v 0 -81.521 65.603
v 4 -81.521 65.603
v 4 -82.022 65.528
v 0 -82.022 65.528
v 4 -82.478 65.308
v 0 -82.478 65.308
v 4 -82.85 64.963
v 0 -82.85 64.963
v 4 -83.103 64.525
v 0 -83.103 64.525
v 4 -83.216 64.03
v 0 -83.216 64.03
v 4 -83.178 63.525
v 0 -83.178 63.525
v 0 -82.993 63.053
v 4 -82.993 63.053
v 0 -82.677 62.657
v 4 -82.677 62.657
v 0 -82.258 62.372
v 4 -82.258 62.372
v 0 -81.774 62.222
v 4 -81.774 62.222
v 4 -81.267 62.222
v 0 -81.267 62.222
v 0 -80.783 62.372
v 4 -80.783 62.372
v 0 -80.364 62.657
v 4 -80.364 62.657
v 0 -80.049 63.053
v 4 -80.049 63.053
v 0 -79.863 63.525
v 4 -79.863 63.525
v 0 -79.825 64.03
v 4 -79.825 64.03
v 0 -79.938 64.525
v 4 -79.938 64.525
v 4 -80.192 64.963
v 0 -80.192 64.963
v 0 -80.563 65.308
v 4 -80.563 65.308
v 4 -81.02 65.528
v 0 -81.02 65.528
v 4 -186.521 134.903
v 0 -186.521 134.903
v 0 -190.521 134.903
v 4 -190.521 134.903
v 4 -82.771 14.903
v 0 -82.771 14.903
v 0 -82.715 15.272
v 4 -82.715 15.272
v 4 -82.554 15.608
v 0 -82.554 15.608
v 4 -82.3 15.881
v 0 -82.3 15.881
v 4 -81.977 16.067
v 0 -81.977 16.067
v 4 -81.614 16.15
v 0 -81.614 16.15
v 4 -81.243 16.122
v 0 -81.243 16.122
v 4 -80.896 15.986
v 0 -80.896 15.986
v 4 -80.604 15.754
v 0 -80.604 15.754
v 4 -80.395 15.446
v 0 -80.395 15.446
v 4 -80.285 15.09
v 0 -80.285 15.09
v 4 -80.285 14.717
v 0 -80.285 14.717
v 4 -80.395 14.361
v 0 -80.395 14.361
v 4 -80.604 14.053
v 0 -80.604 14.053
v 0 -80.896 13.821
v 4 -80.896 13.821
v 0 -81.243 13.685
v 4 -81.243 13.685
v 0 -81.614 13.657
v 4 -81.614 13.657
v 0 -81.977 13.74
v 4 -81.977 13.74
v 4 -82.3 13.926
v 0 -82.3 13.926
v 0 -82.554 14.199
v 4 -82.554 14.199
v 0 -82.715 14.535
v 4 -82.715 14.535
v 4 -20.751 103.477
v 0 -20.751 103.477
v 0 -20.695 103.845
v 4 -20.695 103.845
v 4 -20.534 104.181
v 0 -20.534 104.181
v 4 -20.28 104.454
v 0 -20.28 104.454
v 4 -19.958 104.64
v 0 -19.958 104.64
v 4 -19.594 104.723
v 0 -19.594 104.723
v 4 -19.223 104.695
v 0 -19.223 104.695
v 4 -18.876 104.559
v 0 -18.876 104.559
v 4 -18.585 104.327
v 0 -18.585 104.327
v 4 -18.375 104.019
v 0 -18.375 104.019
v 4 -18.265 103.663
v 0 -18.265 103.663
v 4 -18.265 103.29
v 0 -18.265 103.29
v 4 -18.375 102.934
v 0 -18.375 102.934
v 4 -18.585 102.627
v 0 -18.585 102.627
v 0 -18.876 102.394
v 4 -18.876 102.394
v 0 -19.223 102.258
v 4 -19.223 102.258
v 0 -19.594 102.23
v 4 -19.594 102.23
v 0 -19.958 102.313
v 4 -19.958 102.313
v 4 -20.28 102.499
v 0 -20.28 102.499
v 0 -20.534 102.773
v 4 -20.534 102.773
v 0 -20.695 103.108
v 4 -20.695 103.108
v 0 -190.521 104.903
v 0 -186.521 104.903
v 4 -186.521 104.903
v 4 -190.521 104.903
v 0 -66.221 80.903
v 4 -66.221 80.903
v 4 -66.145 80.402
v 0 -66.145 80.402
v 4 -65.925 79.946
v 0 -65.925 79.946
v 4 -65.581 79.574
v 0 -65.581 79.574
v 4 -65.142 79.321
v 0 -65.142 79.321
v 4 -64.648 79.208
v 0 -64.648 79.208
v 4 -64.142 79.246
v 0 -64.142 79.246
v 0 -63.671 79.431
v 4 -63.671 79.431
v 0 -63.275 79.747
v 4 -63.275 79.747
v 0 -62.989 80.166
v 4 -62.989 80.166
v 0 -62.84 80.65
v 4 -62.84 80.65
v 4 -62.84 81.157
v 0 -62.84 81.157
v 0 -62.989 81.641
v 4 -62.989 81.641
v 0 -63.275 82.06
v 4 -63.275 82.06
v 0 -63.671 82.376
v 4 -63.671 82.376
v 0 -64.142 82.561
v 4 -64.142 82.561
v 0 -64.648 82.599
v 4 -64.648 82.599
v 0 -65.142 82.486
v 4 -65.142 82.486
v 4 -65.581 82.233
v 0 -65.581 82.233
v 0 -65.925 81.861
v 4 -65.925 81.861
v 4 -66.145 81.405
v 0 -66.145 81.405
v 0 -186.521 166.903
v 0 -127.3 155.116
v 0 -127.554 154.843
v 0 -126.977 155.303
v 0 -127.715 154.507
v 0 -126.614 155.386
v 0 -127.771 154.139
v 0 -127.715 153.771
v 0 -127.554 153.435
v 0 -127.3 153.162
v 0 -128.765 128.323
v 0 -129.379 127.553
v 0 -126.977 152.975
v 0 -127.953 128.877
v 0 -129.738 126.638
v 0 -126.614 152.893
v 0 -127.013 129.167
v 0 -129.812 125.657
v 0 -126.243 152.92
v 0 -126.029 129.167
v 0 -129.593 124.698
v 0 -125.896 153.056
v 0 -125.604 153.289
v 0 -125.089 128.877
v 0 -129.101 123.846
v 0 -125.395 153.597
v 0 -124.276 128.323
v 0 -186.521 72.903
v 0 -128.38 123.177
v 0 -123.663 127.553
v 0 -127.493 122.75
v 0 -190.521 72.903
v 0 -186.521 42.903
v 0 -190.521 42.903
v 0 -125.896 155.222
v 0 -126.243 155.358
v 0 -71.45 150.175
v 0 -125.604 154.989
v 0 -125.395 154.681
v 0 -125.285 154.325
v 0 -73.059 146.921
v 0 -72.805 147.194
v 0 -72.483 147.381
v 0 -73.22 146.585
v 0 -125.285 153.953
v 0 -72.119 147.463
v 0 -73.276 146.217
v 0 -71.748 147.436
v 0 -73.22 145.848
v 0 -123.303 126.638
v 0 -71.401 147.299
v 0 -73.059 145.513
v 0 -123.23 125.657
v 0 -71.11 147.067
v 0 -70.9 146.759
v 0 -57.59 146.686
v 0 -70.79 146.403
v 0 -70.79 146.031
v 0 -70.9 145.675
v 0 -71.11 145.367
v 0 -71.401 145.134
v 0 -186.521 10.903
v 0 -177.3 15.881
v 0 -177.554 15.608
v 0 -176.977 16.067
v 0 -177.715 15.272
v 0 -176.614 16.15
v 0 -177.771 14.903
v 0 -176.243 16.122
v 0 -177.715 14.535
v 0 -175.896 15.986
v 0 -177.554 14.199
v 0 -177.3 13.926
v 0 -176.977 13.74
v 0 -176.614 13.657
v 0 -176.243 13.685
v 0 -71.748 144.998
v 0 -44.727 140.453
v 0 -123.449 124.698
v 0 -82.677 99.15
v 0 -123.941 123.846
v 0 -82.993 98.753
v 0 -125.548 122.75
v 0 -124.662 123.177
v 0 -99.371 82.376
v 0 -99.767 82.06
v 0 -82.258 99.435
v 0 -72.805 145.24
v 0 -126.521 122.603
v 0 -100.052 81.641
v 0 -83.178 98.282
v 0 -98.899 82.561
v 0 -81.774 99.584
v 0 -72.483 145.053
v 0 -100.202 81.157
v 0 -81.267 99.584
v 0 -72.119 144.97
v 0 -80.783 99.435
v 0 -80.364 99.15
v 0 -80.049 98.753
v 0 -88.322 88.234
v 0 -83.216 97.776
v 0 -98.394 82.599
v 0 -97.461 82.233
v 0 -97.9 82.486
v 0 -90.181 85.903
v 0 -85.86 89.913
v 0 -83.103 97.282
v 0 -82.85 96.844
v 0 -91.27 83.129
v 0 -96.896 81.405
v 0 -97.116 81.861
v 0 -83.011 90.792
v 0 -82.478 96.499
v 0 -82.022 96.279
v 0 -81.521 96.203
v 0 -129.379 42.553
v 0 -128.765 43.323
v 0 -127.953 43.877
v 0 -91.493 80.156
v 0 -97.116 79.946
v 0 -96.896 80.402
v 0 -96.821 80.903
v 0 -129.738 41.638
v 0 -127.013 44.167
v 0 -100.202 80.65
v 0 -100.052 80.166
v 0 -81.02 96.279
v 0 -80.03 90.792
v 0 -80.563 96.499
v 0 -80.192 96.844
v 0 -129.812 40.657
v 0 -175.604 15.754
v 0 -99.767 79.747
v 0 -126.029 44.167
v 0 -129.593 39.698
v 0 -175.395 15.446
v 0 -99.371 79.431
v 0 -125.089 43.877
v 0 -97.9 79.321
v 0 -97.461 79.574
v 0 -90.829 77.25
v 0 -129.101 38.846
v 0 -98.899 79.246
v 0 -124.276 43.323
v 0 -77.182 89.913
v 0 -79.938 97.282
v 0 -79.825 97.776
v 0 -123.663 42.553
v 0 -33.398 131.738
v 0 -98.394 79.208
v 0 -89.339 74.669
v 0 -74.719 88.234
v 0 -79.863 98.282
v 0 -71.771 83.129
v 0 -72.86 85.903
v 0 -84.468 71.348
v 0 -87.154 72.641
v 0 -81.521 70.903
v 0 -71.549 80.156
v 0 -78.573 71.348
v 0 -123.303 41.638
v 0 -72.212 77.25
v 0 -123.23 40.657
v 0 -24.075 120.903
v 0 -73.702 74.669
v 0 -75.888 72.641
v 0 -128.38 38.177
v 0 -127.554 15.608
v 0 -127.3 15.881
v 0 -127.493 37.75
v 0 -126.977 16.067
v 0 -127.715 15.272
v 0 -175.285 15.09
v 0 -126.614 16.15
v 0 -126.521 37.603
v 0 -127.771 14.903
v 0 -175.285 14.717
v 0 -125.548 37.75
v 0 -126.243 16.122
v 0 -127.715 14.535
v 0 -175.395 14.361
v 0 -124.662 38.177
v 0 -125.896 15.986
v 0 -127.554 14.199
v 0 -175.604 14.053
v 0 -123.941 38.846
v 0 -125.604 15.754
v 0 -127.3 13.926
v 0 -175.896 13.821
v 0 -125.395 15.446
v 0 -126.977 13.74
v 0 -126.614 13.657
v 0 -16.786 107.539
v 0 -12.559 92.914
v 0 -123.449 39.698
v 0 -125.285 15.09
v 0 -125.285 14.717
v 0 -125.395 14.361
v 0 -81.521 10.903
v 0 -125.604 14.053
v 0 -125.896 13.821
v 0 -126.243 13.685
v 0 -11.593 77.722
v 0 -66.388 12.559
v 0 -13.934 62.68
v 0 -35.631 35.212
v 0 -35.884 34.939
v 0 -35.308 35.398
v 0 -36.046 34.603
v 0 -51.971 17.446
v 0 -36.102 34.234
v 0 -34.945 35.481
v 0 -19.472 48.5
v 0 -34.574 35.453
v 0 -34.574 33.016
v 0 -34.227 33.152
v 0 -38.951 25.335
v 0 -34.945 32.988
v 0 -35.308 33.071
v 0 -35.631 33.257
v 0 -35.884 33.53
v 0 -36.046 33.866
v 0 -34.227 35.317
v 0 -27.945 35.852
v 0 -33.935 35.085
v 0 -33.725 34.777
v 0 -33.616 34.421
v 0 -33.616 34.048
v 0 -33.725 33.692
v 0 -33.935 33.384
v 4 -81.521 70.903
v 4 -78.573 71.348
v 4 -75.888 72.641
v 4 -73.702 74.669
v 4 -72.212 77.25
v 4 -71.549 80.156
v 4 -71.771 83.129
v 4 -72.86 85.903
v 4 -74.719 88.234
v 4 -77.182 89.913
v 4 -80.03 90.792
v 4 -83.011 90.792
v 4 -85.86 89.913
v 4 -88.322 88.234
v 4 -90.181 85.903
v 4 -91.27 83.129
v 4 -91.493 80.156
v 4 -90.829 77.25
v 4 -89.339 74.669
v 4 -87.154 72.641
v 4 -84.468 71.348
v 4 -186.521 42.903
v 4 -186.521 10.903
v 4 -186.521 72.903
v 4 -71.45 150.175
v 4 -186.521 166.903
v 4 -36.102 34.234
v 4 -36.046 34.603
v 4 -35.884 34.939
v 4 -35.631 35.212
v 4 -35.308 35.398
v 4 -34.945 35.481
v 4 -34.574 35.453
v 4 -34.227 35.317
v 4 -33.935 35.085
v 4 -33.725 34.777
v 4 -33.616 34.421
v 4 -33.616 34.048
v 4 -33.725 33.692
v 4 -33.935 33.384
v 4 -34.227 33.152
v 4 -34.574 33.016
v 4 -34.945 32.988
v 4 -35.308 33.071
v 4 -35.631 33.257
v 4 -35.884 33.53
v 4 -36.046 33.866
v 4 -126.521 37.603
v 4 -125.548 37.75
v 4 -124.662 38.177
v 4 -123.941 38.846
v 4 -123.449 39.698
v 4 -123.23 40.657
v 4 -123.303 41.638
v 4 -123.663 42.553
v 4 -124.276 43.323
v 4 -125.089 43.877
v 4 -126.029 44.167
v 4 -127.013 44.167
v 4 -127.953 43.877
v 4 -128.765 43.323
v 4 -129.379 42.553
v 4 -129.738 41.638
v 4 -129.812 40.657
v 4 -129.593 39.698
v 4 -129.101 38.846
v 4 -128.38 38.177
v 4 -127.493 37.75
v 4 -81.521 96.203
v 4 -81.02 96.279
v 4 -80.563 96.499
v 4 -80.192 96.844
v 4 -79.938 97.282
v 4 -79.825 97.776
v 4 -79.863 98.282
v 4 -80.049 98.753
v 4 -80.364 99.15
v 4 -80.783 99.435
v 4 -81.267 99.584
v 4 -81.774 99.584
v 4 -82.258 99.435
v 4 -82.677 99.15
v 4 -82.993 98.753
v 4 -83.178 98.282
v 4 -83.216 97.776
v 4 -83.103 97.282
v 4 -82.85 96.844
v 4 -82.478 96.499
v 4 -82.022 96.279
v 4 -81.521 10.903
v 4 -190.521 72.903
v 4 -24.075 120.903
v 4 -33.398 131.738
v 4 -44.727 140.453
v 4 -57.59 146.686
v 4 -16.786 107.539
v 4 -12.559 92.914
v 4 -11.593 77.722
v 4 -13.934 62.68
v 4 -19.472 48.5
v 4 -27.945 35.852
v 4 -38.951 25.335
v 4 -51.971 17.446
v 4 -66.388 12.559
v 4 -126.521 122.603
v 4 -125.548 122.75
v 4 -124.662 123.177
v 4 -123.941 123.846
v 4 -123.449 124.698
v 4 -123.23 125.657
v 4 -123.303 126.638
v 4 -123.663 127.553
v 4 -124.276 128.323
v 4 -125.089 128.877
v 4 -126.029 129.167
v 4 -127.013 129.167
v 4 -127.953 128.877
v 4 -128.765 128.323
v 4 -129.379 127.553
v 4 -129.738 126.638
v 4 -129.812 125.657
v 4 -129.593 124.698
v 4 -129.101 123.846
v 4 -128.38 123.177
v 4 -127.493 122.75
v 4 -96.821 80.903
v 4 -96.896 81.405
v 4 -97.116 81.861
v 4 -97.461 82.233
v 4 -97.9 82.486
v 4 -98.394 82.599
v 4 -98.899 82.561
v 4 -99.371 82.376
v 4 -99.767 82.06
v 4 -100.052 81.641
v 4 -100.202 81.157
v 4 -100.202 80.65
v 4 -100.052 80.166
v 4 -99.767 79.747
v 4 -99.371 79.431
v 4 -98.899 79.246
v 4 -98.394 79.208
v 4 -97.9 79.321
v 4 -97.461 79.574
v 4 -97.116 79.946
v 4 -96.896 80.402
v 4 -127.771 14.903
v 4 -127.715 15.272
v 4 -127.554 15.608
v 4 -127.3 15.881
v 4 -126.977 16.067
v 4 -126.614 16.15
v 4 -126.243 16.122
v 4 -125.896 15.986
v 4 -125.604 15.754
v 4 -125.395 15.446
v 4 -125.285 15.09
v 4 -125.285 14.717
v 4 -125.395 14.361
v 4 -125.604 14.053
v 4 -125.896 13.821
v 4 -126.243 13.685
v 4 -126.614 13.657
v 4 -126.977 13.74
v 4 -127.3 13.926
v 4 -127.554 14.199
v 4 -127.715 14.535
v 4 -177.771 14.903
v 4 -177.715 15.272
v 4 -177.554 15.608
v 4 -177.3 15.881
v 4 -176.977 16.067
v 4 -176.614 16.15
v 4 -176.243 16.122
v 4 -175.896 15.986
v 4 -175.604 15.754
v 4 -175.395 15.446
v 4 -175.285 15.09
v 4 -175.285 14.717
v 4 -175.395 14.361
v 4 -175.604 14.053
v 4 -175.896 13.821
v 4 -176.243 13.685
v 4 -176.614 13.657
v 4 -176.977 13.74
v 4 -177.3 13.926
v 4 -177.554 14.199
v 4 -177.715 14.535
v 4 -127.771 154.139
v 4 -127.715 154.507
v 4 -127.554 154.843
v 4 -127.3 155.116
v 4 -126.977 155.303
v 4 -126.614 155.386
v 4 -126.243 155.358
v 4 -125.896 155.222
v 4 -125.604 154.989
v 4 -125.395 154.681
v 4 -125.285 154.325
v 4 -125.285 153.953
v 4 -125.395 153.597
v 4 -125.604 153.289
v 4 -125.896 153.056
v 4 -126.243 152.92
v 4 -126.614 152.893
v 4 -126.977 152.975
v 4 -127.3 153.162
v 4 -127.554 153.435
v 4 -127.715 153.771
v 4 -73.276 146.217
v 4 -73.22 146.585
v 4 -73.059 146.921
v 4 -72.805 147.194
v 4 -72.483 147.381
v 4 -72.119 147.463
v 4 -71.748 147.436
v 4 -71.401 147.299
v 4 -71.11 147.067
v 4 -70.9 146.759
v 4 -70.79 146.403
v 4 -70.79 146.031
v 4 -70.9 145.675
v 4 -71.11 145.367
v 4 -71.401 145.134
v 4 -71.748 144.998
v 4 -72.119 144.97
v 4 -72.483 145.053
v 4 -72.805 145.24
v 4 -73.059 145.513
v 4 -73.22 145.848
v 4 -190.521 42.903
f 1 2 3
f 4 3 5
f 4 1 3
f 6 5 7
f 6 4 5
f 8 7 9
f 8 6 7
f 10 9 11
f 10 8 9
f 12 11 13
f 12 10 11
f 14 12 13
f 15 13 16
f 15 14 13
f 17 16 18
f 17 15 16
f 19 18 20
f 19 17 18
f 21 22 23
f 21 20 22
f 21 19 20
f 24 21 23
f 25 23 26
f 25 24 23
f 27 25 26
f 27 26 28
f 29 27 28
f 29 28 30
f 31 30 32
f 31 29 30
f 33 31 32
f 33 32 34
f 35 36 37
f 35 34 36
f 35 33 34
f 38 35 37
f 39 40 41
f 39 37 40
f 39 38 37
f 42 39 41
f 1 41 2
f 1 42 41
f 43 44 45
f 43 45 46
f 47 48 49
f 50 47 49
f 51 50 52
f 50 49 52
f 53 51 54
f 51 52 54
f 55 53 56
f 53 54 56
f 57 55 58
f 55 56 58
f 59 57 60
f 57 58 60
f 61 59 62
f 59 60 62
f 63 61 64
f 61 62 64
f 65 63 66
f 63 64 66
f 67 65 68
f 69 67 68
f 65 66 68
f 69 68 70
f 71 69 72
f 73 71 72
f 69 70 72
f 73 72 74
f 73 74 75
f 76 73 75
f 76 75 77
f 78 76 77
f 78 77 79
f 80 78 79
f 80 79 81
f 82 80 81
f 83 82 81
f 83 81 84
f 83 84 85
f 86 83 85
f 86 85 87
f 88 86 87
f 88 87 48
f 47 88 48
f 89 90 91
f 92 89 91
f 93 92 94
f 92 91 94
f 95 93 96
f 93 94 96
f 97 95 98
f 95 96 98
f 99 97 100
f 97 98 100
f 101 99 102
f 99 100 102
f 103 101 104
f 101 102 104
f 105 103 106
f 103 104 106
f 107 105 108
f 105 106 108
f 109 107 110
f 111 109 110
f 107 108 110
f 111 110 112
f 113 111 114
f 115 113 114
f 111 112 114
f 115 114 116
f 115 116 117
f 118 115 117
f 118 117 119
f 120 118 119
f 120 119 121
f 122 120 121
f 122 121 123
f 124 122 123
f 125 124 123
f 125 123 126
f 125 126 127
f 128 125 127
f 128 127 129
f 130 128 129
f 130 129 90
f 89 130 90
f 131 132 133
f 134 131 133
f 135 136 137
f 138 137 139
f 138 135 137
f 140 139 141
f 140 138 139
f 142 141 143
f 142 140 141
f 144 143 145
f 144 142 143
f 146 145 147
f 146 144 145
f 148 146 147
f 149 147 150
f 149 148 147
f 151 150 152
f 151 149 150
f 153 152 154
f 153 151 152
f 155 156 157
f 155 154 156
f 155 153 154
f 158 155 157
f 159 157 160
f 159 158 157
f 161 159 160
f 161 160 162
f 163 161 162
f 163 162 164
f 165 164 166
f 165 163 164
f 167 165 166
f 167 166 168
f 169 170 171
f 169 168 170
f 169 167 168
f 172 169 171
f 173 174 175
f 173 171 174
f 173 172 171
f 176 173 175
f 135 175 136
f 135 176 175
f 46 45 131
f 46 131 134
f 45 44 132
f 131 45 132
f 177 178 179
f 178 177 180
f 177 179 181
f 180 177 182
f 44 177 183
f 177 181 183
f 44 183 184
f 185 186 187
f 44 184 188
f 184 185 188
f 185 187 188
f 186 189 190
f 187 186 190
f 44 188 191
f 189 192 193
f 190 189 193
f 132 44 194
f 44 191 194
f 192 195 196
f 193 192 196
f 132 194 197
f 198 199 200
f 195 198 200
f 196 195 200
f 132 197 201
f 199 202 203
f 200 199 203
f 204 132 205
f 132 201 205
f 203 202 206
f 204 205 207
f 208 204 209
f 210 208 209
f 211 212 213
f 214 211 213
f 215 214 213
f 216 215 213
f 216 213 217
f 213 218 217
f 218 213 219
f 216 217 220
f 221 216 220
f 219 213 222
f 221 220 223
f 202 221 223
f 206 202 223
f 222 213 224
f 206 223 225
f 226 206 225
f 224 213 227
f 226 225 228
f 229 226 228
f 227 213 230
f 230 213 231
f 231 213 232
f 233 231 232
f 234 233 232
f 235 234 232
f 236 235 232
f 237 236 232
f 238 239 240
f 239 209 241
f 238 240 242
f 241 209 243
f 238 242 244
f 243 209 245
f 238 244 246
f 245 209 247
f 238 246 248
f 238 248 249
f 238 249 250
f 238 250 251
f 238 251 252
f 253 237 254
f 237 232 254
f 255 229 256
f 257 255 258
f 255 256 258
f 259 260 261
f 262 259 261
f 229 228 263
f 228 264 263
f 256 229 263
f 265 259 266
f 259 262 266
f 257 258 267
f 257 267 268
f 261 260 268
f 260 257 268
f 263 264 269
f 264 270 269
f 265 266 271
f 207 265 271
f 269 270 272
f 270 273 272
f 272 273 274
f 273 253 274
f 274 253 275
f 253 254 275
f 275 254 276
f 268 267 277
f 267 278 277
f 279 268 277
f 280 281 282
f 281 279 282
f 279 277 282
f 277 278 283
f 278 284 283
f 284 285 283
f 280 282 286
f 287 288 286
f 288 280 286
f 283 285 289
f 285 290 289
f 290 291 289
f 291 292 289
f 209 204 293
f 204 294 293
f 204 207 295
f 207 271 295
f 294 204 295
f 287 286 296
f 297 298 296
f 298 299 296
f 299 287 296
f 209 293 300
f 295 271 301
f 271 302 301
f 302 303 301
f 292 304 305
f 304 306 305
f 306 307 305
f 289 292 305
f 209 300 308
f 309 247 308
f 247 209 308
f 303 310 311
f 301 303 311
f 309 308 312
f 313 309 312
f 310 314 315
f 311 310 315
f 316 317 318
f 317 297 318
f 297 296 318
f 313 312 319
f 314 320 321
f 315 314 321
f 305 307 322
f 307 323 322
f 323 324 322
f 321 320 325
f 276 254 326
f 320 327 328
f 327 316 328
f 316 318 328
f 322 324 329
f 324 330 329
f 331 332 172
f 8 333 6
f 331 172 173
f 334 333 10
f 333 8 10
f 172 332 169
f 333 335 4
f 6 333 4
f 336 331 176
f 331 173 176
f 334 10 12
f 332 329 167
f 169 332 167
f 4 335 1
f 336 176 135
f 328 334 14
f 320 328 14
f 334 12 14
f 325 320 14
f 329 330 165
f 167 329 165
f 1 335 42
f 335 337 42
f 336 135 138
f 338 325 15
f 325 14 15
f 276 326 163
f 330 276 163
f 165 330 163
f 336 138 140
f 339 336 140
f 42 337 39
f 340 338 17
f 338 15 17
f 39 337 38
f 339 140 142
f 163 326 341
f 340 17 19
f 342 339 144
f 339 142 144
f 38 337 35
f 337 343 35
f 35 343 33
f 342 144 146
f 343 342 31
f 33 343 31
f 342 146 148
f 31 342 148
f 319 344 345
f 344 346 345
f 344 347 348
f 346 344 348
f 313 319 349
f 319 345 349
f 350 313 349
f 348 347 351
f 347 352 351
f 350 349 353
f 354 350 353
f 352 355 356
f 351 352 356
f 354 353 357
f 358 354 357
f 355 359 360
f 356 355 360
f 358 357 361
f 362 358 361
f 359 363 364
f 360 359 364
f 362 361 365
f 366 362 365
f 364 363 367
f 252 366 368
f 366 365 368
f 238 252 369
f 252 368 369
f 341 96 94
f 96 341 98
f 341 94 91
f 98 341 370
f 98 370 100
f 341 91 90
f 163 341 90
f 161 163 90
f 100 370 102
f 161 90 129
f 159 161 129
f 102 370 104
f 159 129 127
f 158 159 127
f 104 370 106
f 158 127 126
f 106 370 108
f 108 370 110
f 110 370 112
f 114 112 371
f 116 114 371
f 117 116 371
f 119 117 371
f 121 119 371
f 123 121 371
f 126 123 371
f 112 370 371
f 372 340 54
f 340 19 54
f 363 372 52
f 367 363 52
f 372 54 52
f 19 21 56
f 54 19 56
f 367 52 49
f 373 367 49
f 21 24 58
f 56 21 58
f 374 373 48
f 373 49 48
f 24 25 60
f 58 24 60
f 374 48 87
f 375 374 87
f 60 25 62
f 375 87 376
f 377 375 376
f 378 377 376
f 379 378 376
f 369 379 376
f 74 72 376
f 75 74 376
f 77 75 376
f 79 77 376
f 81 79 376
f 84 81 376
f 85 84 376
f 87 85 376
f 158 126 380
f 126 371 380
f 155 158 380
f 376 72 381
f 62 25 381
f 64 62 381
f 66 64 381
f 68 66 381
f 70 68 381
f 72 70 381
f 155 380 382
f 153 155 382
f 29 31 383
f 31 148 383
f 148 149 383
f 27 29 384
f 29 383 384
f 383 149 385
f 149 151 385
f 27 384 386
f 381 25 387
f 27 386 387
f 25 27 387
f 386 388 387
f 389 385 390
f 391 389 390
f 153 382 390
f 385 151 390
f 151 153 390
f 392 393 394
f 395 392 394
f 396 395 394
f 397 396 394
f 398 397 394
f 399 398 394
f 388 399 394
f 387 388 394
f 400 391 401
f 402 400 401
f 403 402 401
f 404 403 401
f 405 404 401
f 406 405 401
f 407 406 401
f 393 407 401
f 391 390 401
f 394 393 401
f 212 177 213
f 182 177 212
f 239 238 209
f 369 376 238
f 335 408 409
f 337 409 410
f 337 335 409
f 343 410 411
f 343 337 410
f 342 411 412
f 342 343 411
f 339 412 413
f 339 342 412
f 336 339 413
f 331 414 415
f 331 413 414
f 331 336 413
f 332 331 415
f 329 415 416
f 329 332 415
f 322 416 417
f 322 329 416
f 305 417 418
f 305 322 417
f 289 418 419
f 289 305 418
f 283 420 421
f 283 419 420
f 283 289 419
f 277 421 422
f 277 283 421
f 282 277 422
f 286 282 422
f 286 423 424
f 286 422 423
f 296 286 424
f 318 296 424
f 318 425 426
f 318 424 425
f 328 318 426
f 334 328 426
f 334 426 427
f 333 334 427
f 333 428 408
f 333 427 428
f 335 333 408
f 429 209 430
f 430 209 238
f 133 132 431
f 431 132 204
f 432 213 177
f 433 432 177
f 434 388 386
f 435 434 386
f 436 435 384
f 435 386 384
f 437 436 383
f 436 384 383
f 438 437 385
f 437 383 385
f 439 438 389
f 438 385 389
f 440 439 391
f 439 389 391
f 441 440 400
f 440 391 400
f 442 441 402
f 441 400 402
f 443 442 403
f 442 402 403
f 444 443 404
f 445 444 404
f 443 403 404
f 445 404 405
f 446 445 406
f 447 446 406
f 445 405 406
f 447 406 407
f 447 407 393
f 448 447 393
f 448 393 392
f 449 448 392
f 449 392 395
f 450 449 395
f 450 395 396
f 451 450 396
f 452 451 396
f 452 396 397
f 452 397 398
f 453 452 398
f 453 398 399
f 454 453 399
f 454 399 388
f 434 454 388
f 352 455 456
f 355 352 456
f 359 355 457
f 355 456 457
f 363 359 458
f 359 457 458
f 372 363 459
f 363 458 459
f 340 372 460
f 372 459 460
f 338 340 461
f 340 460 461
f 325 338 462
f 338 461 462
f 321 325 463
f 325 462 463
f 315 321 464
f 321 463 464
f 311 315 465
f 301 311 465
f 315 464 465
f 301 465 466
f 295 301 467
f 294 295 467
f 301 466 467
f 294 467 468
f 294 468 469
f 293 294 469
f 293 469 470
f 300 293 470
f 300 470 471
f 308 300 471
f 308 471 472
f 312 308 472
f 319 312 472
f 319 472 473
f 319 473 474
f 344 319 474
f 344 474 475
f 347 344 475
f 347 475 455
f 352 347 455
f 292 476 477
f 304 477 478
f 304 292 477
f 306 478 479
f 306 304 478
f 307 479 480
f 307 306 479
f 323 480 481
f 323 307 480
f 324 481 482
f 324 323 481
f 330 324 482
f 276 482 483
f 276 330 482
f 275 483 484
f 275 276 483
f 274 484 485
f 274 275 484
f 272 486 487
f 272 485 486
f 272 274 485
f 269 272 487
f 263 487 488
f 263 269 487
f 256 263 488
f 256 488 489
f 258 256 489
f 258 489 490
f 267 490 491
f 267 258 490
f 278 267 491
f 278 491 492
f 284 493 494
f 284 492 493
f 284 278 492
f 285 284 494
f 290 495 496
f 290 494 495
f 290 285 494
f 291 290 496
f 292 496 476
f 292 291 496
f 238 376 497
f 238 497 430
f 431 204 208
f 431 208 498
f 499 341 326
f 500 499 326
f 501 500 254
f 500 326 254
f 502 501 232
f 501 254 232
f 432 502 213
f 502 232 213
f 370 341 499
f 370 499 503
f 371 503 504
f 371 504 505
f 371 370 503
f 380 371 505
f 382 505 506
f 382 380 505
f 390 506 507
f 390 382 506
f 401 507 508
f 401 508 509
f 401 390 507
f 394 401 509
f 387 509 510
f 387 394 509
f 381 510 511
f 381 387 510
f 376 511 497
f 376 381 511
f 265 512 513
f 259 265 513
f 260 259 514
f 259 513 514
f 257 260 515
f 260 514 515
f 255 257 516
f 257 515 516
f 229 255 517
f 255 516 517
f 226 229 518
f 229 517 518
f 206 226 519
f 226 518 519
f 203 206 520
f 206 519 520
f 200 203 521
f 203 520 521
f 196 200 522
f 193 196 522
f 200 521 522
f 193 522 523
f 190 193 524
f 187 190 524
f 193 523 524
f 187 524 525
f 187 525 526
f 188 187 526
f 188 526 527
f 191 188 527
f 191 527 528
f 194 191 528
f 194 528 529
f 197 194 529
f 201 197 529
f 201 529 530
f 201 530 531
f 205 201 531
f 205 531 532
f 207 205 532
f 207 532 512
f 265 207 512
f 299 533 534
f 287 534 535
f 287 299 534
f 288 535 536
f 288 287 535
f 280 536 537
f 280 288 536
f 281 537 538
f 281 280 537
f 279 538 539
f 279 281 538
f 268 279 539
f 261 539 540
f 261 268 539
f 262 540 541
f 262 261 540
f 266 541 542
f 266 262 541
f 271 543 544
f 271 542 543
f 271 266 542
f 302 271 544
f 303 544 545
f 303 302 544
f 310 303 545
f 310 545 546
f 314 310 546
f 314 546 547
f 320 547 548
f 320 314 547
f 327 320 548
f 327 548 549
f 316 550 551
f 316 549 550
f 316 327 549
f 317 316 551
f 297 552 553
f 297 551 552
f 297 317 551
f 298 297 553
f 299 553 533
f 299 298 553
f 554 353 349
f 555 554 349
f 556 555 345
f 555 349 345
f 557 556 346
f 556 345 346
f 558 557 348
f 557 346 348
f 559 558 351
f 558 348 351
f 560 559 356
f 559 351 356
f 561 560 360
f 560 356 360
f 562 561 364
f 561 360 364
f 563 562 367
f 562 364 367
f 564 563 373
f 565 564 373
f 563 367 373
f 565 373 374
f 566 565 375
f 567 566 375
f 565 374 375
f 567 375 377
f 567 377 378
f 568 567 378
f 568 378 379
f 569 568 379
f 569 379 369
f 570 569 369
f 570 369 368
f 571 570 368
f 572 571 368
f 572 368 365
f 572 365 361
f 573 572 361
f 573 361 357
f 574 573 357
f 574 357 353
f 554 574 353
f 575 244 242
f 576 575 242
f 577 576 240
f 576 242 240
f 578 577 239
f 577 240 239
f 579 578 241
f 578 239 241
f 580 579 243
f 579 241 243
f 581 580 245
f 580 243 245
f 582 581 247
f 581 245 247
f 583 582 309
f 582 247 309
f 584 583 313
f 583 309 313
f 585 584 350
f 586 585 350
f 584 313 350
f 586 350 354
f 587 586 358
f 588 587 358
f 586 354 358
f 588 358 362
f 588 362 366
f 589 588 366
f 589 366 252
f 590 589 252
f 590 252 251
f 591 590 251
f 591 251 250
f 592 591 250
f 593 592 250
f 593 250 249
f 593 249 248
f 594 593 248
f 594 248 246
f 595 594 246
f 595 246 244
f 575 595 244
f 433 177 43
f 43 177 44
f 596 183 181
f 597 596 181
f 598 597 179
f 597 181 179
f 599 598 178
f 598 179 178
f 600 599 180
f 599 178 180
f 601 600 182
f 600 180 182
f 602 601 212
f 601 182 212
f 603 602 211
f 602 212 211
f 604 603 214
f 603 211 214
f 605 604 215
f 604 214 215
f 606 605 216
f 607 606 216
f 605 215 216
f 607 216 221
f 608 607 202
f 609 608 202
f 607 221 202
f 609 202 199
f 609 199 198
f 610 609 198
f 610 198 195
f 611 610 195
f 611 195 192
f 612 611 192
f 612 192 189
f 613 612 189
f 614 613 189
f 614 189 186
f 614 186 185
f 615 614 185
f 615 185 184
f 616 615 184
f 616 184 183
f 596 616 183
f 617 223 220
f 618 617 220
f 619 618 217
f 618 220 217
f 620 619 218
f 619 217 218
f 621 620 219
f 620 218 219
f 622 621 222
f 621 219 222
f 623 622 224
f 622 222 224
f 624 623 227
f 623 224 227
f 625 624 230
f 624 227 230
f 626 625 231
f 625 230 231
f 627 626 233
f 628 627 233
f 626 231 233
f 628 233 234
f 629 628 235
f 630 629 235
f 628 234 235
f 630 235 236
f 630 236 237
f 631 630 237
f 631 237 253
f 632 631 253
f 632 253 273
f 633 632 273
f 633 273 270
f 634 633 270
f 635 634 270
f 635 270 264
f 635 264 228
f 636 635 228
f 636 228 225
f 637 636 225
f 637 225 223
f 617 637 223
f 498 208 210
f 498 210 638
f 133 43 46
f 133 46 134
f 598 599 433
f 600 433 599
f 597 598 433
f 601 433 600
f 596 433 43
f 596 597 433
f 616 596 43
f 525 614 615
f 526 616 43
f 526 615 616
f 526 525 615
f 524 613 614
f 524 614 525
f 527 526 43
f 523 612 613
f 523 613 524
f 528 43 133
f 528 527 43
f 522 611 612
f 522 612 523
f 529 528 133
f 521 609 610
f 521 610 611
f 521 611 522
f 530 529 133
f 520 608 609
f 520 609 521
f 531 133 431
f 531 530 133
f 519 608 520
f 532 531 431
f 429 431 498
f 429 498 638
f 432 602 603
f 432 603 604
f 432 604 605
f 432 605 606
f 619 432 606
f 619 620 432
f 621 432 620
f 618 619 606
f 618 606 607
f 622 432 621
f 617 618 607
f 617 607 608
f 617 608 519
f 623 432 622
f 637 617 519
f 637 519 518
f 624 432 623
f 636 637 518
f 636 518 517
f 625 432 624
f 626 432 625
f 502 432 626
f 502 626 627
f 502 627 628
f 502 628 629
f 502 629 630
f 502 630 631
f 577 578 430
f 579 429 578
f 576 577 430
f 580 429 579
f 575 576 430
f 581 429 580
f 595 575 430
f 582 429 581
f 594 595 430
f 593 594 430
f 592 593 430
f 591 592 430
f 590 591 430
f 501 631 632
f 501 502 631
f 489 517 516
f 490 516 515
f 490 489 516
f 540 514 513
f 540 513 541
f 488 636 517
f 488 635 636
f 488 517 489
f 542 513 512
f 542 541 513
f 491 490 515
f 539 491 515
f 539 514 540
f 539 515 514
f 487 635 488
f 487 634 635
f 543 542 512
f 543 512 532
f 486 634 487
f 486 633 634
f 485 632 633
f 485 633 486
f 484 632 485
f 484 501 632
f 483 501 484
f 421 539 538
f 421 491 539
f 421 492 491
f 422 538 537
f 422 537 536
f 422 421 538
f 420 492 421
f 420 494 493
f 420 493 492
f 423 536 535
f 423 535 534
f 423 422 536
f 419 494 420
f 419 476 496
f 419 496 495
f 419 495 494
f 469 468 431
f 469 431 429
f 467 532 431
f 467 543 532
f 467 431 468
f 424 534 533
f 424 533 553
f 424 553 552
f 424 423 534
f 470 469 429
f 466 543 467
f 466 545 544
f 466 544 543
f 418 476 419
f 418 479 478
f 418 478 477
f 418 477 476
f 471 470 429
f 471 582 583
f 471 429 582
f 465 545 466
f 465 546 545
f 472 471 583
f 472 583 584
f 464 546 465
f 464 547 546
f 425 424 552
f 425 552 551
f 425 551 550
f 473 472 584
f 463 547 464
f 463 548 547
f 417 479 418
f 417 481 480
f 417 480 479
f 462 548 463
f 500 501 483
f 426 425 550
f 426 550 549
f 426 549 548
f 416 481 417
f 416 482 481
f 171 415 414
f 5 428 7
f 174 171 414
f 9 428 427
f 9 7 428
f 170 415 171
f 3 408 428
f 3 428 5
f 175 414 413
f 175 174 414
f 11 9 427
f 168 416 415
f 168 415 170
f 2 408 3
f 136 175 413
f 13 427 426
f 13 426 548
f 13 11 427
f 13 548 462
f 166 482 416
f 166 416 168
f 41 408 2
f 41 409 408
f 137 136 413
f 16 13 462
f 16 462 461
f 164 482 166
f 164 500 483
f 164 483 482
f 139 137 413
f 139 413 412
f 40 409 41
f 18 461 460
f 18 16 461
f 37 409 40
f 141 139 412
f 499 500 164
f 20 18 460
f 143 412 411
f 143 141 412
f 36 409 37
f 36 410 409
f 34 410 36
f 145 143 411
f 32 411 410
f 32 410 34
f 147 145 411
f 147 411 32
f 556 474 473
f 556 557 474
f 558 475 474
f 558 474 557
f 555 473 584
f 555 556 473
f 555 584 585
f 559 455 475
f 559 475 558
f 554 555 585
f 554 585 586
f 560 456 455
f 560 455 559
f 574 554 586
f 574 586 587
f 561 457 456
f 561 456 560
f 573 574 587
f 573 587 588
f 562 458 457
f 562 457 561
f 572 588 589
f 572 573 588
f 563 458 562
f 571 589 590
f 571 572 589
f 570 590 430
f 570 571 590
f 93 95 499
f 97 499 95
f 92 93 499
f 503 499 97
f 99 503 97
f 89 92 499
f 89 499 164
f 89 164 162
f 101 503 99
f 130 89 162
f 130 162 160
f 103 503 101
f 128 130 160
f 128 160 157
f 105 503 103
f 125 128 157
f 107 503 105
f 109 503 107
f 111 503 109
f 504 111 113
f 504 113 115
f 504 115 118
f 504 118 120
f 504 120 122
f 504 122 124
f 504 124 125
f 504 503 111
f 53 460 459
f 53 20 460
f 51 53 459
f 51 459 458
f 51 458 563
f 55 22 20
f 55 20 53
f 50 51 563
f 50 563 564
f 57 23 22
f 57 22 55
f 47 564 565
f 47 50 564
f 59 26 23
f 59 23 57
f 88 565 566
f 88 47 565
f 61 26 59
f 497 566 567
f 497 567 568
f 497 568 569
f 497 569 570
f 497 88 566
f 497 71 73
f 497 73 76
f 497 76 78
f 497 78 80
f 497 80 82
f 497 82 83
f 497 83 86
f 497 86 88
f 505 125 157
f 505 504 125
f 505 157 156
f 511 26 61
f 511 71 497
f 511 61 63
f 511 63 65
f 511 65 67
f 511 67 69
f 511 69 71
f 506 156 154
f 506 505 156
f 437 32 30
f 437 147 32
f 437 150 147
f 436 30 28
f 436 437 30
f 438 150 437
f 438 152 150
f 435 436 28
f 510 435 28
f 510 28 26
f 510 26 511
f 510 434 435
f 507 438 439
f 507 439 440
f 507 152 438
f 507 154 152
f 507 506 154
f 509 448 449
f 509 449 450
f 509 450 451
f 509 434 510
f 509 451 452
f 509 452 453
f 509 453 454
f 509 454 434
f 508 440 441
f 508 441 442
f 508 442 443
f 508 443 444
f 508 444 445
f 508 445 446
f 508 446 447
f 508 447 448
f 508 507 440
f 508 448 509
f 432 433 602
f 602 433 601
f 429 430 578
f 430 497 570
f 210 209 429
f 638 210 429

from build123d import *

# Parameters (mm, degrees)
AUFSATZ_LINEAR_AUSTRAGEN1_DEPTH      = 4
SKIZZE1_9_R                          = 10
SCHNITT_LINEAR_AUSTRAGEN1_DEPTH      = 6
SCHNITT_LINEAR_AUSTRAGEN2_DEPTH      = 251.325290812
SCHNITT_LINEAR_AUSTRAGEN2_DEPTH_BACK = 10
M3_GEWINDEBOHRUNG1_D                 = 2.5
M3_GEWINDEBOHRUNG1_DEPTH             = 8.5
M3_GEWINDEBOHRUNG1_TIP               = 0.751075774
KREISMUSTER1_COUNT                   = 4
DURCHGANGSLOCH_F_R_M61_D             = 6.6
DURCHGANGSLOCH_F_R_M61_DEPTH         = 17
DURCHGANGSLOCH_F_R_M61_TIP           = 1.982840043
SKIZZE32_W                           = 4
SKIZZE32_H                           = 30
AUFSATZ_LINEAR_AUSTRAGEN2_DEPTH      = 4


with BuildPart() as part:
    # Skizze1 → Aufsatz-Linear austragen1 (new body)
    with BuildSketch(Plane(origin=(0, 0, 0), x_dir=(0, 0, -1), z_dir=(1, 0, 0))):
        with BuildLine():
            Line((-120.903454086, -13.395859459), (-120.903454086, -24.075118314))
            ThreePointArc((-120.903454086, -24.075118314), (-140.453351678, -44.726591756), (-150.175306123, -71.450465968))
            Line((-150.175306123, -71.450465968), (-166.903454086, -186.520744783))
            Line((-166.903454086, -186.520744783), (-10.903454086, -186.520744783))
            Line((-10.903454086, -186.520744783), (-1.903454086, -186.520744783))
            Line((-1.903454086, -186.520744783), (-1.903454086, -81.52074478))
            ThreePointArc((-1.903454086, -81.52074478), (-41.654250272, -12.960552248), (-120.903454086, -13.395859459))
        make_face()
    extrude(amount=AUFSATZ_LINEAR_AUSTRAGEN1_DEPTH)

    # Skizze1<9> → Schnitt-Linear austragen1 (cut)
    with BuildSketch(Plane(origin=(0, 0, 0), x_dir=(0, 0, -1), z_dir=(1, 0, 0))):
        with Locations((-80.903454086, -81.52074478)):
            Circle(SKIZZE1_9_R)
    extrude(amount=SCHNITT_LINEAR_AUSTRAGEN1_DEPTH, mode=Mode.SUBTRACT)

    # Skizze3 → Durchgangsloch für M31 (revolve, cut)
    with BuildSketch(Plane(origin=(0, -81.52074478, 63.903454086), x_dir=(0, 0, 1), z_dir=(0, 1, 0))):
        Polygon((0, 0), (0, 21.021463052), (1.7, 20), (1.7, 0), align=None)
    durchgangsloch_f_r_m31 = revolve(axis=Axis((-6.35, -81.52074478, 63.903454086), (1, 0, 0)), mode=Mode.SUBTRACT)

    # Skizze1<18> → Schnitt-Linear austragen2 (cut, two sides: drawn at the far end of the back side and taken through both)
    with BuildSketch(Plane(origin=(0, 0, 0), x_dir=(0, 0, -1), z_dir=(1, 0, 0)).offset(-SCHNITT_LINEAR_AUSTRAGEN2_DEPTH_BACK)):
        with BuildLine():
            ThreePointArc((-1.903454086, -81.52074478), (-41.654250272, -12.960552248), (-120.903454086, -13.395859459))
            Line((-120.903454086, -13.395859459), (-120.903454086, -24.075118314))
            ThreePointArc((-120.903454086, -24.075118314), (-48.499750594, -19.47237655), (-10.903454086, -81.52074478))
            Line((-10.903454086, -81.52074478), (-10.903454086, -186.520744783))
            Line((-10.903454086, -186.520744783), (-1.903454086, -186.520744783))
            Line((-1.903454086, -186.520744783), (-1.903454086, -81.52074478))
        make_face()
    extrude(amount=SCHNITT_LINEAR_AUSTRAGEN2_DEPTH + SCHNITT_LINEAR_AUSTRAGEN2_DEPTH_BACK, mode=Mode.SUBTRACT)

    # M3 Gewindebohrung1
    with Locations(Plane.YZ.offset(4)):
        with Locations((-176.520744783, 14.903454086), (-126.520744783, 14.903454086), (-34.851697221, 34.234406527), (-19.501031808, 103.476783545), (-81.52074478, 14.903454086), (-72.025910472, 146.216914578), (-126.520744783, 154.139009327)):
            Hole(M3_GEWINDEBOHRUNG1_D / 2, depth=M3_GEWINDEBOHRUNG1_DEPTH)
            with Locations((0, 0, -(M3_GEWINDEBOHRUNG1_DEPTH + M3_GEWINDEBOHRUNG1_TIP / 2))):  # 118° drill point
                Cone(0, M3_GEWINDEBOHRUNG1_D / 2, M3_GEWINDEBOHRUNG1_TIP, mode=Mode.SUBTRACT)

    # Kreismuster1: Durchgangsloch für M31 ×4 about axis
    kreismuster1_axis = Axis((0, -81.52074478, 80.903454086), (1, 0, 0))
    for i in range(1, KREISMUSTER1_COUNT):
        add(durchgangsloch_f_r_m31.rotate(kreismuster1_axis, i * 360 / KREISMUSTER1_COUNT), mode=Mode.SUBTRACT)

    # Durchgangsloch für M61
    with Locations(Plane.ZY):
        with Locations((40.903454086, -126.520744783), (125.903454086, -126.520744783)):
            Hole(DURCHGANGSLOCH_F_R_M61_D / 2, depth=DURCHGANGSLOCH_F_R_M61_DEPTH)
            with Locations((0, 0, -(DURCHGANGSLOCH_F_R_M61_DEPTH + DURCHGANGSLOCH_F_R_M61_TIP / 2))):  # 118° drill point
                Cone(0, DURCHGANGSLOCH_F_R_M61_D / 2, DURCHGANGSLOCH_F_R_M61_TIP, mode=Mode.SUBTRACT)

    # Skizze32 → Aufsatz-Linear austragen2 (add)
    with BuildSketch(Plane.XZ.offset(186.520744783)):
        with Locations((2, 119.903454086)):
            Rectangle(SKIZZE32_W, SKIZZE32_H)
        with Locations((2, 57.903454086)):
            Rectangle(SKIZZE32_W, SKIZZE32_H)
    extrude(amount=AUFSATZ_LINEAR_AUSTRAGEN2_DEPTH)


solid = part.part
